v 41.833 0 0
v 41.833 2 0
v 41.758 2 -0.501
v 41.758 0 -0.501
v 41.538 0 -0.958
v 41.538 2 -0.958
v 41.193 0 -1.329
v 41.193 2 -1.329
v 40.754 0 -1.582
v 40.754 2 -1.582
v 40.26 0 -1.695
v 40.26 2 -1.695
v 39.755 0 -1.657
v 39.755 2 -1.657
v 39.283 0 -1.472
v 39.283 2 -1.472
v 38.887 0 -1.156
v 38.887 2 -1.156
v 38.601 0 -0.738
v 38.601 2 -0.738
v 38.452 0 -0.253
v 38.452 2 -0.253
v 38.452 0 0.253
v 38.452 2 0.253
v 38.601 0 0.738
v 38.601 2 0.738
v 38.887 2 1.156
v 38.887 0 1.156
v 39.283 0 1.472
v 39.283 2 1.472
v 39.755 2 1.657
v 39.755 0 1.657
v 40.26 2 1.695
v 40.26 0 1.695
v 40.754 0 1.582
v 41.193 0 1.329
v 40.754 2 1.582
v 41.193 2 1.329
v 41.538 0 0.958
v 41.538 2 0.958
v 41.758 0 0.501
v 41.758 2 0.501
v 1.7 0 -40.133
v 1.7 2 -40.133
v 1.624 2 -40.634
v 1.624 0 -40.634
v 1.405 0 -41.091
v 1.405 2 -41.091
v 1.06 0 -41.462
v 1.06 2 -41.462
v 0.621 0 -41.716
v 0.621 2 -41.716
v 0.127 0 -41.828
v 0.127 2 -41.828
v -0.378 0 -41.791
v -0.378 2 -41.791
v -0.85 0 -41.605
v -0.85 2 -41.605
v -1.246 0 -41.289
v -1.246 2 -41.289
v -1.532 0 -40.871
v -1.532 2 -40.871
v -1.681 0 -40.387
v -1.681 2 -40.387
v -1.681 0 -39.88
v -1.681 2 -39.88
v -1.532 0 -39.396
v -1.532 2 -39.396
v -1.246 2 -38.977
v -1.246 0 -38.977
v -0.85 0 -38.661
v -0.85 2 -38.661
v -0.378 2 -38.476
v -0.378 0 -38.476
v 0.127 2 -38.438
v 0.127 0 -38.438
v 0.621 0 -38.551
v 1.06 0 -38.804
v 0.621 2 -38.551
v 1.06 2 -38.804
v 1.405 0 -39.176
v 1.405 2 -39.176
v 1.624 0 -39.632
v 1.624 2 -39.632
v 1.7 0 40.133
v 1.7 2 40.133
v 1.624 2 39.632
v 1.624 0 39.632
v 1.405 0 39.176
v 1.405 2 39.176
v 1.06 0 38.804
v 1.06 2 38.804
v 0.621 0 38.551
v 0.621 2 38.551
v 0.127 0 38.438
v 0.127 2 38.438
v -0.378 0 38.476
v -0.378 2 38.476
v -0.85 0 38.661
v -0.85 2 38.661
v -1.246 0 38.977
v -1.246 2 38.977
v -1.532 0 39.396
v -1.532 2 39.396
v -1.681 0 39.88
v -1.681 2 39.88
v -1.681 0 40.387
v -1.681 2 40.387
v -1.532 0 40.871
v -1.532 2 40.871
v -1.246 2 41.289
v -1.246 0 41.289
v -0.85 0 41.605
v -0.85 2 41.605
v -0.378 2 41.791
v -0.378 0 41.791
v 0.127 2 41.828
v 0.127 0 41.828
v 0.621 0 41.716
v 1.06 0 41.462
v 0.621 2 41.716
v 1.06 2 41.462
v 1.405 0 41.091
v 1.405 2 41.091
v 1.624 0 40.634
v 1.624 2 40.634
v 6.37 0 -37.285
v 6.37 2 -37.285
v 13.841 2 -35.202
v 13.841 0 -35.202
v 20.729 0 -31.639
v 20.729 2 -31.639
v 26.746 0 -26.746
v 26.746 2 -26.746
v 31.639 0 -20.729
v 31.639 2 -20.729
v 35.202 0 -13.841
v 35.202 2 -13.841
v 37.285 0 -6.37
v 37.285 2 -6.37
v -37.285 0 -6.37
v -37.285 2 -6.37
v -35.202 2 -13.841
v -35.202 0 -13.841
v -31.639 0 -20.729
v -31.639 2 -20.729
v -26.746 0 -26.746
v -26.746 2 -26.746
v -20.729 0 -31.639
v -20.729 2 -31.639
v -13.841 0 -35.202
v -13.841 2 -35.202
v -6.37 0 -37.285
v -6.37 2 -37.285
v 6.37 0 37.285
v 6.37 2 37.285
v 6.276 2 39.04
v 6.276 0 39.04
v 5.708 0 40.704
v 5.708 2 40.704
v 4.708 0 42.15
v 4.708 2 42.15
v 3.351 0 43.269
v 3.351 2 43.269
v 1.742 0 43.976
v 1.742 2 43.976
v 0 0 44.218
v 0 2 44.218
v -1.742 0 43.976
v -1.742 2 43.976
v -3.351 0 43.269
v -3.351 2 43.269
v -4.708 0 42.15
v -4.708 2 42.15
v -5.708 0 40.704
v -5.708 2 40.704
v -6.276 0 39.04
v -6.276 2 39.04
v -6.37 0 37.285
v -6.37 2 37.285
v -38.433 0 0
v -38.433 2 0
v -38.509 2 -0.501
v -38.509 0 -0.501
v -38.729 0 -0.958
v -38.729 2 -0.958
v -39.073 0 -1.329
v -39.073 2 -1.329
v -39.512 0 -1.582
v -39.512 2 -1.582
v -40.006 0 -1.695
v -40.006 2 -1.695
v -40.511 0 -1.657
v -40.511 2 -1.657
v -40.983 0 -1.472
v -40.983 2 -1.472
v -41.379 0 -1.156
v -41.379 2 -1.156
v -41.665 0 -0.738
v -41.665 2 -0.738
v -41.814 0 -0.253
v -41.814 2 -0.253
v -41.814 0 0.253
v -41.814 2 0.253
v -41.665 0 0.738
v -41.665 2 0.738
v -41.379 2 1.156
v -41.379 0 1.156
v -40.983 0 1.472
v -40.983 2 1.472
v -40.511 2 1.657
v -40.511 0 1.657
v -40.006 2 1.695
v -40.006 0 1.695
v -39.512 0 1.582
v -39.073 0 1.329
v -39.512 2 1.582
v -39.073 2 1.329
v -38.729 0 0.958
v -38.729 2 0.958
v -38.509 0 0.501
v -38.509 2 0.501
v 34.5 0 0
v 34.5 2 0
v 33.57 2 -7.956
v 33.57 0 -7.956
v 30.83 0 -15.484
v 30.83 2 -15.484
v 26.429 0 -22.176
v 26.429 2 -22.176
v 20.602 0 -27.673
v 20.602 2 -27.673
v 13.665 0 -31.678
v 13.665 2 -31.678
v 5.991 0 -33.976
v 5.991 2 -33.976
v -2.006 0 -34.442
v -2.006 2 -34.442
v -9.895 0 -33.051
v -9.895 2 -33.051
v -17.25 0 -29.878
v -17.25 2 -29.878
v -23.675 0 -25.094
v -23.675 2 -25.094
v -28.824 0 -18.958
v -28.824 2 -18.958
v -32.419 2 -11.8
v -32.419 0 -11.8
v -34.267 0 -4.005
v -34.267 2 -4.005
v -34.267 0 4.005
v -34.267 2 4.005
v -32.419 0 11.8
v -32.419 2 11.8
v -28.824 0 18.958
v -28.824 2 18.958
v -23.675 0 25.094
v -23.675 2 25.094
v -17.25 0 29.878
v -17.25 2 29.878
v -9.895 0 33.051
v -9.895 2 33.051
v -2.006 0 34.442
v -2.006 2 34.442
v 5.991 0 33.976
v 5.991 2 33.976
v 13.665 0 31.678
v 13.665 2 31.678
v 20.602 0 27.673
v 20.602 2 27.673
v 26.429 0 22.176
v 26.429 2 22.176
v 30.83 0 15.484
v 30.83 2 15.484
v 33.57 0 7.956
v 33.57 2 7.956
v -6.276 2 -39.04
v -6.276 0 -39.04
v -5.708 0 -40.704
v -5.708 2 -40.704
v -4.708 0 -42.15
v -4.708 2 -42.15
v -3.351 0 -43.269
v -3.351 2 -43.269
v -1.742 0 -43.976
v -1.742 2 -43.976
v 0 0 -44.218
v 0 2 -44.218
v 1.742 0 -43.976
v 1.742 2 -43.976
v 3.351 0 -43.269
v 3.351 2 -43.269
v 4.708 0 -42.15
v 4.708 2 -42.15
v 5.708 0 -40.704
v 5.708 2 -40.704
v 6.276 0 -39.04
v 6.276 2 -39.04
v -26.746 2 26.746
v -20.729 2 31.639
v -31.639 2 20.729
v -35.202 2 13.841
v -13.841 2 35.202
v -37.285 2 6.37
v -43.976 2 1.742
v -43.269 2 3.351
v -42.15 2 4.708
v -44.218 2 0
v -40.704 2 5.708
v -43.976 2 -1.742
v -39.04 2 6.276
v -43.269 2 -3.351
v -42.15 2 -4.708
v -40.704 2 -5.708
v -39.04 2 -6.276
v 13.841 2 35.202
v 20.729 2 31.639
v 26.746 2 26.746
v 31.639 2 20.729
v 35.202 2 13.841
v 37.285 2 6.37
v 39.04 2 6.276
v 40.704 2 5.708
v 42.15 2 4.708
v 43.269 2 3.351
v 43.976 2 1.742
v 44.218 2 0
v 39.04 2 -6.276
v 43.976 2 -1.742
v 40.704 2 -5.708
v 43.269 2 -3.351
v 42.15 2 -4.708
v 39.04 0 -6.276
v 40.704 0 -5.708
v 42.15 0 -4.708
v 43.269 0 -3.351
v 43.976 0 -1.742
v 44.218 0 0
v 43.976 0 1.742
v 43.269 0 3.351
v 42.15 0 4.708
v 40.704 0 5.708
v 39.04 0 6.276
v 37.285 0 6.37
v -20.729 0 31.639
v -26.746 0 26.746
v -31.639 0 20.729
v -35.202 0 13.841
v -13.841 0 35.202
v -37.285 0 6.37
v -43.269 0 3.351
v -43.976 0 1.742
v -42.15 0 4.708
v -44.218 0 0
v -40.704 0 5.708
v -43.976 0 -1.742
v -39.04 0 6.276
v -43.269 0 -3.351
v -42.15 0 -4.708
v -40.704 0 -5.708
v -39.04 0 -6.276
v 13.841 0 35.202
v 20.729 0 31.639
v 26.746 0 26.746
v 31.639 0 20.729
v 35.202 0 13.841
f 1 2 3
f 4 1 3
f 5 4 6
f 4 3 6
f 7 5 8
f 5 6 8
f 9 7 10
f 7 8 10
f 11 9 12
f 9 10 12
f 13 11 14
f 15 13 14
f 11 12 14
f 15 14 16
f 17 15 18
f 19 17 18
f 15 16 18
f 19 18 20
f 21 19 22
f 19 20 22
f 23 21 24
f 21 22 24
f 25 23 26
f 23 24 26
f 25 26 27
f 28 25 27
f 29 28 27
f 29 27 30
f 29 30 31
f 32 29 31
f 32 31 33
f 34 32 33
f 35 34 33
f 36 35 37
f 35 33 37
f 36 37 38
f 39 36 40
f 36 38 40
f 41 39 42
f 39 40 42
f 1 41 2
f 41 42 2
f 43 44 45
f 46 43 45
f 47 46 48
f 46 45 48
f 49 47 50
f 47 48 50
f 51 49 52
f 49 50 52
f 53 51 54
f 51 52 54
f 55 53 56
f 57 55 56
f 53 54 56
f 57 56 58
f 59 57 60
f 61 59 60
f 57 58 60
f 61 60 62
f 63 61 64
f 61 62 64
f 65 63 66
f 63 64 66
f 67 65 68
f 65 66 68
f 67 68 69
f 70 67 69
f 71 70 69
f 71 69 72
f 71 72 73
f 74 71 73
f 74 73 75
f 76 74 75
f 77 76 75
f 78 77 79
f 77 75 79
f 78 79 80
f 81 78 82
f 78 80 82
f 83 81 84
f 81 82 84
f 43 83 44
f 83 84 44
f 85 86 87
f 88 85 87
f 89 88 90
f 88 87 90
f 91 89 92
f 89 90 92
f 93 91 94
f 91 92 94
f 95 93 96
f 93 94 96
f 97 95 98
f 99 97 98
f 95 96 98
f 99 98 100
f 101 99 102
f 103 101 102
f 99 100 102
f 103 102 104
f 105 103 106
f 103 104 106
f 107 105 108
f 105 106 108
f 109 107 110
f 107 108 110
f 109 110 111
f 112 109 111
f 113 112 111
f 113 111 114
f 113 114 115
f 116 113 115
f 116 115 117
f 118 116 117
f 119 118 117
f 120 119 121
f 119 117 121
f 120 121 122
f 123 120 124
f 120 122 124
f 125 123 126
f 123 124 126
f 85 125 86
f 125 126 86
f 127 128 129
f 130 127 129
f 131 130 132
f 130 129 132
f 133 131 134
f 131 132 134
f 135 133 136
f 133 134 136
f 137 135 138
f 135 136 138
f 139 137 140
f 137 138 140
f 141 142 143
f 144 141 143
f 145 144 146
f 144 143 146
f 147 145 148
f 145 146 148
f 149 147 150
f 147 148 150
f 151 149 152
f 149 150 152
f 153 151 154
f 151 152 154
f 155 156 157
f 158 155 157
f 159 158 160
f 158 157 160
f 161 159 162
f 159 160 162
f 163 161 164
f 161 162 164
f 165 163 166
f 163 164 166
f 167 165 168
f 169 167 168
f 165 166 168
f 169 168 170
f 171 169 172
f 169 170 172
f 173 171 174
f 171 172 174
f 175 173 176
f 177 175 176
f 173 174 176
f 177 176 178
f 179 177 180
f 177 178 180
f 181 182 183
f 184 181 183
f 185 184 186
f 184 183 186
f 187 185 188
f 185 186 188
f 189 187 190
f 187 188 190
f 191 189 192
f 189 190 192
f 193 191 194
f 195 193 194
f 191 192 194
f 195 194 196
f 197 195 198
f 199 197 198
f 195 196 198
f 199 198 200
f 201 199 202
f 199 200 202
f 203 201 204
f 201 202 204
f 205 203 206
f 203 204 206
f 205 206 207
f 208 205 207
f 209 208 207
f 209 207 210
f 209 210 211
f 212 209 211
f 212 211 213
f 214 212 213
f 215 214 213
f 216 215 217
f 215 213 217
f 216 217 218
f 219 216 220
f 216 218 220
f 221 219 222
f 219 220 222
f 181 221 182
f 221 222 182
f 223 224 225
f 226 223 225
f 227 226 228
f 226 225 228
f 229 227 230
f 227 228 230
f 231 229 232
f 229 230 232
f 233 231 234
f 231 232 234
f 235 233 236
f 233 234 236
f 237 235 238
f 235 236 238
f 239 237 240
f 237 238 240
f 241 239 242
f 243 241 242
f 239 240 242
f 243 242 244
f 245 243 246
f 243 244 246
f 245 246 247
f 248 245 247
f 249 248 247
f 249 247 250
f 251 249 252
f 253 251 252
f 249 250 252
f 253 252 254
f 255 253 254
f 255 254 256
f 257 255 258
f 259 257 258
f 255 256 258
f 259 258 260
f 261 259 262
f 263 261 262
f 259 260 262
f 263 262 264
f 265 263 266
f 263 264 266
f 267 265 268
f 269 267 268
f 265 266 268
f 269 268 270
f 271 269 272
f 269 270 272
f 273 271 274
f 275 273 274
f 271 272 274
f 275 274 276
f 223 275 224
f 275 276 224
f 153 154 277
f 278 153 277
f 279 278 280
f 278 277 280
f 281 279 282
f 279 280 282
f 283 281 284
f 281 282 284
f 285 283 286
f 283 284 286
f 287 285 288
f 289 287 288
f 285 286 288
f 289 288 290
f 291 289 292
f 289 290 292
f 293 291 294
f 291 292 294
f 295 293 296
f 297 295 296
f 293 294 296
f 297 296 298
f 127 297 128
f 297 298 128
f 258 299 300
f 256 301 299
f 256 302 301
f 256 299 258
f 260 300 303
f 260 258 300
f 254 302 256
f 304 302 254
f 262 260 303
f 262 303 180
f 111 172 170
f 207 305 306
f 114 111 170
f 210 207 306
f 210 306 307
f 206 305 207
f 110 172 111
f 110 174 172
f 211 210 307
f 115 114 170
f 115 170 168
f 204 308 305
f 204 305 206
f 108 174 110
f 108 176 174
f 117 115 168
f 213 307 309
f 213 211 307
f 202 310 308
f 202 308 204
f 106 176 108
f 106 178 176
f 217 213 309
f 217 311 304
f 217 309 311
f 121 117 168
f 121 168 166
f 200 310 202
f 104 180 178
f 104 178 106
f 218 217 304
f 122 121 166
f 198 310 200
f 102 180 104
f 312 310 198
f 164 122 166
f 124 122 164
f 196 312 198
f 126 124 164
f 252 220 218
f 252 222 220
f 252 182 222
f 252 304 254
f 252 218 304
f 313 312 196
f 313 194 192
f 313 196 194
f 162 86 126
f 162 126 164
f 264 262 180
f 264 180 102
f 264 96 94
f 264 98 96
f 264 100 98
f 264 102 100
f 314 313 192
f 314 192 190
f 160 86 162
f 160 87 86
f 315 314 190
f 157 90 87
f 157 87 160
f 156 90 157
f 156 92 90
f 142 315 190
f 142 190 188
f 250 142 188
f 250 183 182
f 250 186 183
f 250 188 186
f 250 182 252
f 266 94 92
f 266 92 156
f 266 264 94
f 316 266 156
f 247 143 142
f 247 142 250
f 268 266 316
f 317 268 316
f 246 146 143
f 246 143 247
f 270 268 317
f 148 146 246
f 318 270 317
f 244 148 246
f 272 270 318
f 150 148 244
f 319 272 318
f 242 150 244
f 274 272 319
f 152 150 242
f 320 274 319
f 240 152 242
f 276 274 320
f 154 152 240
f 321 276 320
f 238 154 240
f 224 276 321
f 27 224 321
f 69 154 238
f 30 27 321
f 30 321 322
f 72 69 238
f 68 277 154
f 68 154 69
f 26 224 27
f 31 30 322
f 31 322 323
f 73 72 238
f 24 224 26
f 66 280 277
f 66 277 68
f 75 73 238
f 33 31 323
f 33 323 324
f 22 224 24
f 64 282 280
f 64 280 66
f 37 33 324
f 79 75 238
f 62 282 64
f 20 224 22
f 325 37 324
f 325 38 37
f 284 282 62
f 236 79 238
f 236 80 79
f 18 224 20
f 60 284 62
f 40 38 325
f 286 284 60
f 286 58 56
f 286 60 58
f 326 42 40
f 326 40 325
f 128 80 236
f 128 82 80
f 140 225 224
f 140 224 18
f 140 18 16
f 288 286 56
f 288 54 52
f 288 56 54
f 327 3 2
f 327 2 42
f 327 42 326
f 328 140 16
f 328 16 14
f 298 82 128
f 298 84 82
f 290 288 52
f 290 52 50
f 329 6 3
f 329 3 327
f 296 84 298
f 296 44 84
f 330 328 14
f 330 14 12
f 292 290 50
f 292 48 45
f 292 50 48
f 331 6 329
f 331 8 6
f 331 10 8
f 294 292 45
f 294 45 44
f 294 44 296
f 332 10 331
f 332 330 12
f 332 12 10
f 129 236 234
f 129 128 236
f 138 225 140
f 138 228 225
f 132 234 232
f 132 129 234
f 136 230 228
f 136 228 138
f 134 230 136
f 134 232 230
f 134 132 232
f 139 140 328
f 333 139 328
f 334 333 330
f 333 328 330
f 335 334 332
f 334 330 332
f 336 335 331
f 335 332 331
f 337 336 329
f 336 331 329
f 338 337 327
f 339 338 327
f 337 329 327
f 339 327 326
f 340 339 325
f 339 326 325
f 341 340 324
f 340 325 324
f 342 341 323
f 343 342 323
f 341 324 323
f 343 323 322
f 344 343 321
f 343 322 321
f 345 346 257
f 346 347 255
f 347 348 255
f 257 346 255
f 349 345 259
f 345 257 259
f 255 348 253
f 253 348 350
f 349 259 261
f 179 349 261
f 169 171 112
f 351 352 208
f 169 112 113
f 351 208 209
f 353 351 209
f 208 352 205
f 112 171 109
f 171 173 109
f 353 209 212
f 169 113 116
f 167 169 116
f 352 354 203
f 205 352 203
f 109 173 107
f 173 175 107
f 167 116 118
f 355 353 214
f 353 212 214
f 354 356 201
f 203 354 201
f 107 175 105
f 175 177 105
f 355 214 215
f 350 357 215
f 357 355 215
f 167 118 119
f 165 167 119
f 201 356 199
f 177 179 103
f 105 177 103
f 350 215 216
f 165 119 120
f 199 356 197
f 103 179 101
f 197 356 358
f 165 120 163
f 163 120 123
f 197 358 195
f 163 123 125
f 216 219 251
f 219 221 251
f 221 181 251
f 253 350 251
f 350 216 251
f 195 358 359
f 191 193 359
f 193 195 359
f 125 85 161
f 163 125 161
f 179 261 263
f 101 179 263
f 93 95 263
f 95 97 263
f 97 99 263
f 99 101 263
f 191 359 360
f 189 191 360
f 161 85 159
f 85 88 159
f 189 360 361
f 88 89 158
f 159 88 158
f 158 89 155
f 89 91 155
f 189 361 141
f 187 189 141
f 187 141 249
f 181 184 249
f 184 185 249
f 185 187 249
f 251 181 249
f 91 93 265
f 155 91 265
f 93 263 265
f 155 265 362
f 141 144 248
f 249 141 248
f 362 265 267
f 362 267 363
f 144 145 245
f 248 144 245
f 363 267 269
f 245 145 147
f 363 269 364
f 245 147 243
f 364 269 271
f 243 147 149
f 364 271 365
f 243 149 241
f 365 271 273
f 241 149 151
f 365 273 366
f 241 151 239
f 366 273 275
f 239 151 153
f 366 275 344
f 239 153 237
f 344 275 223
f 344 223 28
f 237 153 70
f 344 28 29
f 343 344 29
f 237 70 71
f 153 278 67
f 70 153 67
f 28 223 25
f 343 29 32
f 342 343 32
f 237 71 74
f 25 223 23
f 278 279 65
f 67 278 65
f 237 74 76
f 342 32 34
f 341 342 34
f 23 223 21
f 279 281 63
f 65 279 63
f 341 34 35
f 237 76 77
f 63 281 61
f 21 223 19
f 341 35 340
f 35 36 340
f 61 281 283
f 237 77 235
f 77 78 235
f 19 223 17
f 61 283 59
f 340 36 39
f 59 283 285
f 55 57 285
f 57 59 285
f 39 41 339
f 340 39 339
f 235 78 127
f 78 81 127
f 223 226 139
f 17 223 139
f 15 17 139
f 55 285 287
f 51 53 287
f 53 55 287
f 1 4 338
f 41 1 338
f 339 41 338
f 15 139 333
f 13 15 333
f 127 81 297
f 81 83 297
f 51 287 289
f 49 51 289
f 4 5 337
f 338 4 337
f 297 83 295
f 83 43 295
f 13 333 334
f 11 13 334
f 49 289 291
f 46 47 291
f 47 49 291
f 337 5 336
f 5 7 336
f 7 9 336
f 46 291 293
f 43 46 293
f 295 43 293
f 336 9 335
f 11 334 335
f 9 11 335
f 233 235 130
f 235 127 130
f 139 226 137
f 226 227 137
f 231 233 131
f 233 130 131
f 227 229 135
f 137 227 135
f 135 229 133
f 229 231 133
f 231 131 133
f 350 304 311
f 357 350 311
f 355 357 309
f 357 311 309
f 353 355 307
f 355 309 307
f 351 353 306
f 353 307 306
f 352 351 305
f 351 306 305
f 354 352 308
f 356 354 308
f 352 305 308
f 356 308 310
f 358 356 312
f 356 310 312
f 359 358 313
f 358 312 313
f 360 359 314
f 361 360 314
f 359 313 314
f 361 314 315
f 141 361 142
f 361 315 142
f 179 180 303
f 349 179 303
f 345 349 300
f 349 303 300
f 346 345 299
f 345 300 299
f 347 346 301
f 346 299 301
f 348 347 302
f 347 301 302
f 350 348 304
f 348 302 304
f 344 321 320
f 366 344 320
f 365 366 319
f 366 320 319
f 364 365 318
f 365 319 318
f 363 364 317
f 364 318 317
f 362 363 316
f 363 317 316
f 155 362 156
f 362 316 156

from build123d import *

# Parameters (mm, degrees)
SKETCH3_W           = 236.719908988
SKETCH3_H           = 211.092865268
BOSS_EXTRUDE2_DEPTH = 2
SKETCH4_R           = 34.5
CUT_EXTRUDE2_DEPTH  = 2
SKETCH5_W           = 236.719908988
SKETCH5_H           = 211.092865268
CUT_EXTRUDE3_DEPTH  = 2
SKETCH6_R           = 1.7
CUT_EXTRUDE4_DEPTH  = 2


with BuildPart() as part:
    # Sketch3 → Boss-Extrude2 (new body)
    with BuildSketch(Plane(origin=(0, 0, 0), x_dir=(1, 0, 0), z_dir=(0, 1, 0))):
        Rectangle(SKETCH3_W, SKETCH3_H)
    extrude(amount=BOSS_EXTRUDE2_DEPTH)

    # Sketch4 → Cut-Extrude2 (cut)
    with BuildSketch(Plane(origin=(0, 2, 0), x_dir=(1, 0, 0), z_dir=(0, 1, 0))):
        Circle(SKETCH4_R)
    extrude(amount=-CUT_EXTRUDE2_DEPTH, mode=Mode.SUBTRACT)

    # Sketch5 → Cut-Extrude3 (cut)
    with BuildSketch(Plane(origin=(0, 2, 0), x_dir=(1, 0, 0), z_dir=(0, 1, 0))):
        Rectangle(SKETCH5_W, SKETCH5_H)
        with BuildLine():
            ThreePointArc((6.370089382, 37.28475005), (26.746313998, 26.746313998), (37.28475005, 6.370089382))
            ThreePointArc((37.28475005, 6.370089382), (44.217957746, 0), (37.28475005, -6.370089382))
            ThreePointArc((37.28475005, -6.370089382), (26.746313998, -26.746313998), (6.370089382, -37.28475005))
            ThreePointArc((6.370089382, -37.28475005), (0, -44.217957746), (-6.370089382, -37.28475005))
            ThreePointArc((-6.370089382, -37.28475005), (-26.746313998, -26.746313998), (-37.28475005, -6.370089382))
            ThreePointArc((-37.28475005, -6.370089382), (-44.217957746, 0), (-37.28475005, 6.370089382))
            ThreePointArc((-37.28475005, 6.370089382), (-26.746313998, 26.746313998), (-6.370089382, 37.28475005))
            ThreePointArc((-6.370089382, 37.28475005), (0, 44.217957746), (6.370089382, 37.28475005))
        make_face(mode=Mode.SUBTRACT)
    extrude(amount=-CUT_EXTRUDE3_DEPTH, mode=Mode.SUBTRACT)

    # Sketch6 → Cut-Extrude4 (cut)
    with BuildSketch(Plane(origin=(0, 2, 0), x_dir=(1, 0, 0), z_dir=(0, 1, 0))):
        with Locations((0, 40.133145431)):
            Circle(SKETCH6_R)
        with Locations((-40.133145431, 0)):
            Circle(SKETCH6_R)
        with Locations((0, -40.133145431)):
            Circle(SKETCH6_R)
        with Locations((40.133145431, 0)):
            Circle(SKETCH6_R)
    extrude(amount=-CUT_EXTRUDE4_DEPTH, mode=Mode.SUBTRACT)


solid = part.part
